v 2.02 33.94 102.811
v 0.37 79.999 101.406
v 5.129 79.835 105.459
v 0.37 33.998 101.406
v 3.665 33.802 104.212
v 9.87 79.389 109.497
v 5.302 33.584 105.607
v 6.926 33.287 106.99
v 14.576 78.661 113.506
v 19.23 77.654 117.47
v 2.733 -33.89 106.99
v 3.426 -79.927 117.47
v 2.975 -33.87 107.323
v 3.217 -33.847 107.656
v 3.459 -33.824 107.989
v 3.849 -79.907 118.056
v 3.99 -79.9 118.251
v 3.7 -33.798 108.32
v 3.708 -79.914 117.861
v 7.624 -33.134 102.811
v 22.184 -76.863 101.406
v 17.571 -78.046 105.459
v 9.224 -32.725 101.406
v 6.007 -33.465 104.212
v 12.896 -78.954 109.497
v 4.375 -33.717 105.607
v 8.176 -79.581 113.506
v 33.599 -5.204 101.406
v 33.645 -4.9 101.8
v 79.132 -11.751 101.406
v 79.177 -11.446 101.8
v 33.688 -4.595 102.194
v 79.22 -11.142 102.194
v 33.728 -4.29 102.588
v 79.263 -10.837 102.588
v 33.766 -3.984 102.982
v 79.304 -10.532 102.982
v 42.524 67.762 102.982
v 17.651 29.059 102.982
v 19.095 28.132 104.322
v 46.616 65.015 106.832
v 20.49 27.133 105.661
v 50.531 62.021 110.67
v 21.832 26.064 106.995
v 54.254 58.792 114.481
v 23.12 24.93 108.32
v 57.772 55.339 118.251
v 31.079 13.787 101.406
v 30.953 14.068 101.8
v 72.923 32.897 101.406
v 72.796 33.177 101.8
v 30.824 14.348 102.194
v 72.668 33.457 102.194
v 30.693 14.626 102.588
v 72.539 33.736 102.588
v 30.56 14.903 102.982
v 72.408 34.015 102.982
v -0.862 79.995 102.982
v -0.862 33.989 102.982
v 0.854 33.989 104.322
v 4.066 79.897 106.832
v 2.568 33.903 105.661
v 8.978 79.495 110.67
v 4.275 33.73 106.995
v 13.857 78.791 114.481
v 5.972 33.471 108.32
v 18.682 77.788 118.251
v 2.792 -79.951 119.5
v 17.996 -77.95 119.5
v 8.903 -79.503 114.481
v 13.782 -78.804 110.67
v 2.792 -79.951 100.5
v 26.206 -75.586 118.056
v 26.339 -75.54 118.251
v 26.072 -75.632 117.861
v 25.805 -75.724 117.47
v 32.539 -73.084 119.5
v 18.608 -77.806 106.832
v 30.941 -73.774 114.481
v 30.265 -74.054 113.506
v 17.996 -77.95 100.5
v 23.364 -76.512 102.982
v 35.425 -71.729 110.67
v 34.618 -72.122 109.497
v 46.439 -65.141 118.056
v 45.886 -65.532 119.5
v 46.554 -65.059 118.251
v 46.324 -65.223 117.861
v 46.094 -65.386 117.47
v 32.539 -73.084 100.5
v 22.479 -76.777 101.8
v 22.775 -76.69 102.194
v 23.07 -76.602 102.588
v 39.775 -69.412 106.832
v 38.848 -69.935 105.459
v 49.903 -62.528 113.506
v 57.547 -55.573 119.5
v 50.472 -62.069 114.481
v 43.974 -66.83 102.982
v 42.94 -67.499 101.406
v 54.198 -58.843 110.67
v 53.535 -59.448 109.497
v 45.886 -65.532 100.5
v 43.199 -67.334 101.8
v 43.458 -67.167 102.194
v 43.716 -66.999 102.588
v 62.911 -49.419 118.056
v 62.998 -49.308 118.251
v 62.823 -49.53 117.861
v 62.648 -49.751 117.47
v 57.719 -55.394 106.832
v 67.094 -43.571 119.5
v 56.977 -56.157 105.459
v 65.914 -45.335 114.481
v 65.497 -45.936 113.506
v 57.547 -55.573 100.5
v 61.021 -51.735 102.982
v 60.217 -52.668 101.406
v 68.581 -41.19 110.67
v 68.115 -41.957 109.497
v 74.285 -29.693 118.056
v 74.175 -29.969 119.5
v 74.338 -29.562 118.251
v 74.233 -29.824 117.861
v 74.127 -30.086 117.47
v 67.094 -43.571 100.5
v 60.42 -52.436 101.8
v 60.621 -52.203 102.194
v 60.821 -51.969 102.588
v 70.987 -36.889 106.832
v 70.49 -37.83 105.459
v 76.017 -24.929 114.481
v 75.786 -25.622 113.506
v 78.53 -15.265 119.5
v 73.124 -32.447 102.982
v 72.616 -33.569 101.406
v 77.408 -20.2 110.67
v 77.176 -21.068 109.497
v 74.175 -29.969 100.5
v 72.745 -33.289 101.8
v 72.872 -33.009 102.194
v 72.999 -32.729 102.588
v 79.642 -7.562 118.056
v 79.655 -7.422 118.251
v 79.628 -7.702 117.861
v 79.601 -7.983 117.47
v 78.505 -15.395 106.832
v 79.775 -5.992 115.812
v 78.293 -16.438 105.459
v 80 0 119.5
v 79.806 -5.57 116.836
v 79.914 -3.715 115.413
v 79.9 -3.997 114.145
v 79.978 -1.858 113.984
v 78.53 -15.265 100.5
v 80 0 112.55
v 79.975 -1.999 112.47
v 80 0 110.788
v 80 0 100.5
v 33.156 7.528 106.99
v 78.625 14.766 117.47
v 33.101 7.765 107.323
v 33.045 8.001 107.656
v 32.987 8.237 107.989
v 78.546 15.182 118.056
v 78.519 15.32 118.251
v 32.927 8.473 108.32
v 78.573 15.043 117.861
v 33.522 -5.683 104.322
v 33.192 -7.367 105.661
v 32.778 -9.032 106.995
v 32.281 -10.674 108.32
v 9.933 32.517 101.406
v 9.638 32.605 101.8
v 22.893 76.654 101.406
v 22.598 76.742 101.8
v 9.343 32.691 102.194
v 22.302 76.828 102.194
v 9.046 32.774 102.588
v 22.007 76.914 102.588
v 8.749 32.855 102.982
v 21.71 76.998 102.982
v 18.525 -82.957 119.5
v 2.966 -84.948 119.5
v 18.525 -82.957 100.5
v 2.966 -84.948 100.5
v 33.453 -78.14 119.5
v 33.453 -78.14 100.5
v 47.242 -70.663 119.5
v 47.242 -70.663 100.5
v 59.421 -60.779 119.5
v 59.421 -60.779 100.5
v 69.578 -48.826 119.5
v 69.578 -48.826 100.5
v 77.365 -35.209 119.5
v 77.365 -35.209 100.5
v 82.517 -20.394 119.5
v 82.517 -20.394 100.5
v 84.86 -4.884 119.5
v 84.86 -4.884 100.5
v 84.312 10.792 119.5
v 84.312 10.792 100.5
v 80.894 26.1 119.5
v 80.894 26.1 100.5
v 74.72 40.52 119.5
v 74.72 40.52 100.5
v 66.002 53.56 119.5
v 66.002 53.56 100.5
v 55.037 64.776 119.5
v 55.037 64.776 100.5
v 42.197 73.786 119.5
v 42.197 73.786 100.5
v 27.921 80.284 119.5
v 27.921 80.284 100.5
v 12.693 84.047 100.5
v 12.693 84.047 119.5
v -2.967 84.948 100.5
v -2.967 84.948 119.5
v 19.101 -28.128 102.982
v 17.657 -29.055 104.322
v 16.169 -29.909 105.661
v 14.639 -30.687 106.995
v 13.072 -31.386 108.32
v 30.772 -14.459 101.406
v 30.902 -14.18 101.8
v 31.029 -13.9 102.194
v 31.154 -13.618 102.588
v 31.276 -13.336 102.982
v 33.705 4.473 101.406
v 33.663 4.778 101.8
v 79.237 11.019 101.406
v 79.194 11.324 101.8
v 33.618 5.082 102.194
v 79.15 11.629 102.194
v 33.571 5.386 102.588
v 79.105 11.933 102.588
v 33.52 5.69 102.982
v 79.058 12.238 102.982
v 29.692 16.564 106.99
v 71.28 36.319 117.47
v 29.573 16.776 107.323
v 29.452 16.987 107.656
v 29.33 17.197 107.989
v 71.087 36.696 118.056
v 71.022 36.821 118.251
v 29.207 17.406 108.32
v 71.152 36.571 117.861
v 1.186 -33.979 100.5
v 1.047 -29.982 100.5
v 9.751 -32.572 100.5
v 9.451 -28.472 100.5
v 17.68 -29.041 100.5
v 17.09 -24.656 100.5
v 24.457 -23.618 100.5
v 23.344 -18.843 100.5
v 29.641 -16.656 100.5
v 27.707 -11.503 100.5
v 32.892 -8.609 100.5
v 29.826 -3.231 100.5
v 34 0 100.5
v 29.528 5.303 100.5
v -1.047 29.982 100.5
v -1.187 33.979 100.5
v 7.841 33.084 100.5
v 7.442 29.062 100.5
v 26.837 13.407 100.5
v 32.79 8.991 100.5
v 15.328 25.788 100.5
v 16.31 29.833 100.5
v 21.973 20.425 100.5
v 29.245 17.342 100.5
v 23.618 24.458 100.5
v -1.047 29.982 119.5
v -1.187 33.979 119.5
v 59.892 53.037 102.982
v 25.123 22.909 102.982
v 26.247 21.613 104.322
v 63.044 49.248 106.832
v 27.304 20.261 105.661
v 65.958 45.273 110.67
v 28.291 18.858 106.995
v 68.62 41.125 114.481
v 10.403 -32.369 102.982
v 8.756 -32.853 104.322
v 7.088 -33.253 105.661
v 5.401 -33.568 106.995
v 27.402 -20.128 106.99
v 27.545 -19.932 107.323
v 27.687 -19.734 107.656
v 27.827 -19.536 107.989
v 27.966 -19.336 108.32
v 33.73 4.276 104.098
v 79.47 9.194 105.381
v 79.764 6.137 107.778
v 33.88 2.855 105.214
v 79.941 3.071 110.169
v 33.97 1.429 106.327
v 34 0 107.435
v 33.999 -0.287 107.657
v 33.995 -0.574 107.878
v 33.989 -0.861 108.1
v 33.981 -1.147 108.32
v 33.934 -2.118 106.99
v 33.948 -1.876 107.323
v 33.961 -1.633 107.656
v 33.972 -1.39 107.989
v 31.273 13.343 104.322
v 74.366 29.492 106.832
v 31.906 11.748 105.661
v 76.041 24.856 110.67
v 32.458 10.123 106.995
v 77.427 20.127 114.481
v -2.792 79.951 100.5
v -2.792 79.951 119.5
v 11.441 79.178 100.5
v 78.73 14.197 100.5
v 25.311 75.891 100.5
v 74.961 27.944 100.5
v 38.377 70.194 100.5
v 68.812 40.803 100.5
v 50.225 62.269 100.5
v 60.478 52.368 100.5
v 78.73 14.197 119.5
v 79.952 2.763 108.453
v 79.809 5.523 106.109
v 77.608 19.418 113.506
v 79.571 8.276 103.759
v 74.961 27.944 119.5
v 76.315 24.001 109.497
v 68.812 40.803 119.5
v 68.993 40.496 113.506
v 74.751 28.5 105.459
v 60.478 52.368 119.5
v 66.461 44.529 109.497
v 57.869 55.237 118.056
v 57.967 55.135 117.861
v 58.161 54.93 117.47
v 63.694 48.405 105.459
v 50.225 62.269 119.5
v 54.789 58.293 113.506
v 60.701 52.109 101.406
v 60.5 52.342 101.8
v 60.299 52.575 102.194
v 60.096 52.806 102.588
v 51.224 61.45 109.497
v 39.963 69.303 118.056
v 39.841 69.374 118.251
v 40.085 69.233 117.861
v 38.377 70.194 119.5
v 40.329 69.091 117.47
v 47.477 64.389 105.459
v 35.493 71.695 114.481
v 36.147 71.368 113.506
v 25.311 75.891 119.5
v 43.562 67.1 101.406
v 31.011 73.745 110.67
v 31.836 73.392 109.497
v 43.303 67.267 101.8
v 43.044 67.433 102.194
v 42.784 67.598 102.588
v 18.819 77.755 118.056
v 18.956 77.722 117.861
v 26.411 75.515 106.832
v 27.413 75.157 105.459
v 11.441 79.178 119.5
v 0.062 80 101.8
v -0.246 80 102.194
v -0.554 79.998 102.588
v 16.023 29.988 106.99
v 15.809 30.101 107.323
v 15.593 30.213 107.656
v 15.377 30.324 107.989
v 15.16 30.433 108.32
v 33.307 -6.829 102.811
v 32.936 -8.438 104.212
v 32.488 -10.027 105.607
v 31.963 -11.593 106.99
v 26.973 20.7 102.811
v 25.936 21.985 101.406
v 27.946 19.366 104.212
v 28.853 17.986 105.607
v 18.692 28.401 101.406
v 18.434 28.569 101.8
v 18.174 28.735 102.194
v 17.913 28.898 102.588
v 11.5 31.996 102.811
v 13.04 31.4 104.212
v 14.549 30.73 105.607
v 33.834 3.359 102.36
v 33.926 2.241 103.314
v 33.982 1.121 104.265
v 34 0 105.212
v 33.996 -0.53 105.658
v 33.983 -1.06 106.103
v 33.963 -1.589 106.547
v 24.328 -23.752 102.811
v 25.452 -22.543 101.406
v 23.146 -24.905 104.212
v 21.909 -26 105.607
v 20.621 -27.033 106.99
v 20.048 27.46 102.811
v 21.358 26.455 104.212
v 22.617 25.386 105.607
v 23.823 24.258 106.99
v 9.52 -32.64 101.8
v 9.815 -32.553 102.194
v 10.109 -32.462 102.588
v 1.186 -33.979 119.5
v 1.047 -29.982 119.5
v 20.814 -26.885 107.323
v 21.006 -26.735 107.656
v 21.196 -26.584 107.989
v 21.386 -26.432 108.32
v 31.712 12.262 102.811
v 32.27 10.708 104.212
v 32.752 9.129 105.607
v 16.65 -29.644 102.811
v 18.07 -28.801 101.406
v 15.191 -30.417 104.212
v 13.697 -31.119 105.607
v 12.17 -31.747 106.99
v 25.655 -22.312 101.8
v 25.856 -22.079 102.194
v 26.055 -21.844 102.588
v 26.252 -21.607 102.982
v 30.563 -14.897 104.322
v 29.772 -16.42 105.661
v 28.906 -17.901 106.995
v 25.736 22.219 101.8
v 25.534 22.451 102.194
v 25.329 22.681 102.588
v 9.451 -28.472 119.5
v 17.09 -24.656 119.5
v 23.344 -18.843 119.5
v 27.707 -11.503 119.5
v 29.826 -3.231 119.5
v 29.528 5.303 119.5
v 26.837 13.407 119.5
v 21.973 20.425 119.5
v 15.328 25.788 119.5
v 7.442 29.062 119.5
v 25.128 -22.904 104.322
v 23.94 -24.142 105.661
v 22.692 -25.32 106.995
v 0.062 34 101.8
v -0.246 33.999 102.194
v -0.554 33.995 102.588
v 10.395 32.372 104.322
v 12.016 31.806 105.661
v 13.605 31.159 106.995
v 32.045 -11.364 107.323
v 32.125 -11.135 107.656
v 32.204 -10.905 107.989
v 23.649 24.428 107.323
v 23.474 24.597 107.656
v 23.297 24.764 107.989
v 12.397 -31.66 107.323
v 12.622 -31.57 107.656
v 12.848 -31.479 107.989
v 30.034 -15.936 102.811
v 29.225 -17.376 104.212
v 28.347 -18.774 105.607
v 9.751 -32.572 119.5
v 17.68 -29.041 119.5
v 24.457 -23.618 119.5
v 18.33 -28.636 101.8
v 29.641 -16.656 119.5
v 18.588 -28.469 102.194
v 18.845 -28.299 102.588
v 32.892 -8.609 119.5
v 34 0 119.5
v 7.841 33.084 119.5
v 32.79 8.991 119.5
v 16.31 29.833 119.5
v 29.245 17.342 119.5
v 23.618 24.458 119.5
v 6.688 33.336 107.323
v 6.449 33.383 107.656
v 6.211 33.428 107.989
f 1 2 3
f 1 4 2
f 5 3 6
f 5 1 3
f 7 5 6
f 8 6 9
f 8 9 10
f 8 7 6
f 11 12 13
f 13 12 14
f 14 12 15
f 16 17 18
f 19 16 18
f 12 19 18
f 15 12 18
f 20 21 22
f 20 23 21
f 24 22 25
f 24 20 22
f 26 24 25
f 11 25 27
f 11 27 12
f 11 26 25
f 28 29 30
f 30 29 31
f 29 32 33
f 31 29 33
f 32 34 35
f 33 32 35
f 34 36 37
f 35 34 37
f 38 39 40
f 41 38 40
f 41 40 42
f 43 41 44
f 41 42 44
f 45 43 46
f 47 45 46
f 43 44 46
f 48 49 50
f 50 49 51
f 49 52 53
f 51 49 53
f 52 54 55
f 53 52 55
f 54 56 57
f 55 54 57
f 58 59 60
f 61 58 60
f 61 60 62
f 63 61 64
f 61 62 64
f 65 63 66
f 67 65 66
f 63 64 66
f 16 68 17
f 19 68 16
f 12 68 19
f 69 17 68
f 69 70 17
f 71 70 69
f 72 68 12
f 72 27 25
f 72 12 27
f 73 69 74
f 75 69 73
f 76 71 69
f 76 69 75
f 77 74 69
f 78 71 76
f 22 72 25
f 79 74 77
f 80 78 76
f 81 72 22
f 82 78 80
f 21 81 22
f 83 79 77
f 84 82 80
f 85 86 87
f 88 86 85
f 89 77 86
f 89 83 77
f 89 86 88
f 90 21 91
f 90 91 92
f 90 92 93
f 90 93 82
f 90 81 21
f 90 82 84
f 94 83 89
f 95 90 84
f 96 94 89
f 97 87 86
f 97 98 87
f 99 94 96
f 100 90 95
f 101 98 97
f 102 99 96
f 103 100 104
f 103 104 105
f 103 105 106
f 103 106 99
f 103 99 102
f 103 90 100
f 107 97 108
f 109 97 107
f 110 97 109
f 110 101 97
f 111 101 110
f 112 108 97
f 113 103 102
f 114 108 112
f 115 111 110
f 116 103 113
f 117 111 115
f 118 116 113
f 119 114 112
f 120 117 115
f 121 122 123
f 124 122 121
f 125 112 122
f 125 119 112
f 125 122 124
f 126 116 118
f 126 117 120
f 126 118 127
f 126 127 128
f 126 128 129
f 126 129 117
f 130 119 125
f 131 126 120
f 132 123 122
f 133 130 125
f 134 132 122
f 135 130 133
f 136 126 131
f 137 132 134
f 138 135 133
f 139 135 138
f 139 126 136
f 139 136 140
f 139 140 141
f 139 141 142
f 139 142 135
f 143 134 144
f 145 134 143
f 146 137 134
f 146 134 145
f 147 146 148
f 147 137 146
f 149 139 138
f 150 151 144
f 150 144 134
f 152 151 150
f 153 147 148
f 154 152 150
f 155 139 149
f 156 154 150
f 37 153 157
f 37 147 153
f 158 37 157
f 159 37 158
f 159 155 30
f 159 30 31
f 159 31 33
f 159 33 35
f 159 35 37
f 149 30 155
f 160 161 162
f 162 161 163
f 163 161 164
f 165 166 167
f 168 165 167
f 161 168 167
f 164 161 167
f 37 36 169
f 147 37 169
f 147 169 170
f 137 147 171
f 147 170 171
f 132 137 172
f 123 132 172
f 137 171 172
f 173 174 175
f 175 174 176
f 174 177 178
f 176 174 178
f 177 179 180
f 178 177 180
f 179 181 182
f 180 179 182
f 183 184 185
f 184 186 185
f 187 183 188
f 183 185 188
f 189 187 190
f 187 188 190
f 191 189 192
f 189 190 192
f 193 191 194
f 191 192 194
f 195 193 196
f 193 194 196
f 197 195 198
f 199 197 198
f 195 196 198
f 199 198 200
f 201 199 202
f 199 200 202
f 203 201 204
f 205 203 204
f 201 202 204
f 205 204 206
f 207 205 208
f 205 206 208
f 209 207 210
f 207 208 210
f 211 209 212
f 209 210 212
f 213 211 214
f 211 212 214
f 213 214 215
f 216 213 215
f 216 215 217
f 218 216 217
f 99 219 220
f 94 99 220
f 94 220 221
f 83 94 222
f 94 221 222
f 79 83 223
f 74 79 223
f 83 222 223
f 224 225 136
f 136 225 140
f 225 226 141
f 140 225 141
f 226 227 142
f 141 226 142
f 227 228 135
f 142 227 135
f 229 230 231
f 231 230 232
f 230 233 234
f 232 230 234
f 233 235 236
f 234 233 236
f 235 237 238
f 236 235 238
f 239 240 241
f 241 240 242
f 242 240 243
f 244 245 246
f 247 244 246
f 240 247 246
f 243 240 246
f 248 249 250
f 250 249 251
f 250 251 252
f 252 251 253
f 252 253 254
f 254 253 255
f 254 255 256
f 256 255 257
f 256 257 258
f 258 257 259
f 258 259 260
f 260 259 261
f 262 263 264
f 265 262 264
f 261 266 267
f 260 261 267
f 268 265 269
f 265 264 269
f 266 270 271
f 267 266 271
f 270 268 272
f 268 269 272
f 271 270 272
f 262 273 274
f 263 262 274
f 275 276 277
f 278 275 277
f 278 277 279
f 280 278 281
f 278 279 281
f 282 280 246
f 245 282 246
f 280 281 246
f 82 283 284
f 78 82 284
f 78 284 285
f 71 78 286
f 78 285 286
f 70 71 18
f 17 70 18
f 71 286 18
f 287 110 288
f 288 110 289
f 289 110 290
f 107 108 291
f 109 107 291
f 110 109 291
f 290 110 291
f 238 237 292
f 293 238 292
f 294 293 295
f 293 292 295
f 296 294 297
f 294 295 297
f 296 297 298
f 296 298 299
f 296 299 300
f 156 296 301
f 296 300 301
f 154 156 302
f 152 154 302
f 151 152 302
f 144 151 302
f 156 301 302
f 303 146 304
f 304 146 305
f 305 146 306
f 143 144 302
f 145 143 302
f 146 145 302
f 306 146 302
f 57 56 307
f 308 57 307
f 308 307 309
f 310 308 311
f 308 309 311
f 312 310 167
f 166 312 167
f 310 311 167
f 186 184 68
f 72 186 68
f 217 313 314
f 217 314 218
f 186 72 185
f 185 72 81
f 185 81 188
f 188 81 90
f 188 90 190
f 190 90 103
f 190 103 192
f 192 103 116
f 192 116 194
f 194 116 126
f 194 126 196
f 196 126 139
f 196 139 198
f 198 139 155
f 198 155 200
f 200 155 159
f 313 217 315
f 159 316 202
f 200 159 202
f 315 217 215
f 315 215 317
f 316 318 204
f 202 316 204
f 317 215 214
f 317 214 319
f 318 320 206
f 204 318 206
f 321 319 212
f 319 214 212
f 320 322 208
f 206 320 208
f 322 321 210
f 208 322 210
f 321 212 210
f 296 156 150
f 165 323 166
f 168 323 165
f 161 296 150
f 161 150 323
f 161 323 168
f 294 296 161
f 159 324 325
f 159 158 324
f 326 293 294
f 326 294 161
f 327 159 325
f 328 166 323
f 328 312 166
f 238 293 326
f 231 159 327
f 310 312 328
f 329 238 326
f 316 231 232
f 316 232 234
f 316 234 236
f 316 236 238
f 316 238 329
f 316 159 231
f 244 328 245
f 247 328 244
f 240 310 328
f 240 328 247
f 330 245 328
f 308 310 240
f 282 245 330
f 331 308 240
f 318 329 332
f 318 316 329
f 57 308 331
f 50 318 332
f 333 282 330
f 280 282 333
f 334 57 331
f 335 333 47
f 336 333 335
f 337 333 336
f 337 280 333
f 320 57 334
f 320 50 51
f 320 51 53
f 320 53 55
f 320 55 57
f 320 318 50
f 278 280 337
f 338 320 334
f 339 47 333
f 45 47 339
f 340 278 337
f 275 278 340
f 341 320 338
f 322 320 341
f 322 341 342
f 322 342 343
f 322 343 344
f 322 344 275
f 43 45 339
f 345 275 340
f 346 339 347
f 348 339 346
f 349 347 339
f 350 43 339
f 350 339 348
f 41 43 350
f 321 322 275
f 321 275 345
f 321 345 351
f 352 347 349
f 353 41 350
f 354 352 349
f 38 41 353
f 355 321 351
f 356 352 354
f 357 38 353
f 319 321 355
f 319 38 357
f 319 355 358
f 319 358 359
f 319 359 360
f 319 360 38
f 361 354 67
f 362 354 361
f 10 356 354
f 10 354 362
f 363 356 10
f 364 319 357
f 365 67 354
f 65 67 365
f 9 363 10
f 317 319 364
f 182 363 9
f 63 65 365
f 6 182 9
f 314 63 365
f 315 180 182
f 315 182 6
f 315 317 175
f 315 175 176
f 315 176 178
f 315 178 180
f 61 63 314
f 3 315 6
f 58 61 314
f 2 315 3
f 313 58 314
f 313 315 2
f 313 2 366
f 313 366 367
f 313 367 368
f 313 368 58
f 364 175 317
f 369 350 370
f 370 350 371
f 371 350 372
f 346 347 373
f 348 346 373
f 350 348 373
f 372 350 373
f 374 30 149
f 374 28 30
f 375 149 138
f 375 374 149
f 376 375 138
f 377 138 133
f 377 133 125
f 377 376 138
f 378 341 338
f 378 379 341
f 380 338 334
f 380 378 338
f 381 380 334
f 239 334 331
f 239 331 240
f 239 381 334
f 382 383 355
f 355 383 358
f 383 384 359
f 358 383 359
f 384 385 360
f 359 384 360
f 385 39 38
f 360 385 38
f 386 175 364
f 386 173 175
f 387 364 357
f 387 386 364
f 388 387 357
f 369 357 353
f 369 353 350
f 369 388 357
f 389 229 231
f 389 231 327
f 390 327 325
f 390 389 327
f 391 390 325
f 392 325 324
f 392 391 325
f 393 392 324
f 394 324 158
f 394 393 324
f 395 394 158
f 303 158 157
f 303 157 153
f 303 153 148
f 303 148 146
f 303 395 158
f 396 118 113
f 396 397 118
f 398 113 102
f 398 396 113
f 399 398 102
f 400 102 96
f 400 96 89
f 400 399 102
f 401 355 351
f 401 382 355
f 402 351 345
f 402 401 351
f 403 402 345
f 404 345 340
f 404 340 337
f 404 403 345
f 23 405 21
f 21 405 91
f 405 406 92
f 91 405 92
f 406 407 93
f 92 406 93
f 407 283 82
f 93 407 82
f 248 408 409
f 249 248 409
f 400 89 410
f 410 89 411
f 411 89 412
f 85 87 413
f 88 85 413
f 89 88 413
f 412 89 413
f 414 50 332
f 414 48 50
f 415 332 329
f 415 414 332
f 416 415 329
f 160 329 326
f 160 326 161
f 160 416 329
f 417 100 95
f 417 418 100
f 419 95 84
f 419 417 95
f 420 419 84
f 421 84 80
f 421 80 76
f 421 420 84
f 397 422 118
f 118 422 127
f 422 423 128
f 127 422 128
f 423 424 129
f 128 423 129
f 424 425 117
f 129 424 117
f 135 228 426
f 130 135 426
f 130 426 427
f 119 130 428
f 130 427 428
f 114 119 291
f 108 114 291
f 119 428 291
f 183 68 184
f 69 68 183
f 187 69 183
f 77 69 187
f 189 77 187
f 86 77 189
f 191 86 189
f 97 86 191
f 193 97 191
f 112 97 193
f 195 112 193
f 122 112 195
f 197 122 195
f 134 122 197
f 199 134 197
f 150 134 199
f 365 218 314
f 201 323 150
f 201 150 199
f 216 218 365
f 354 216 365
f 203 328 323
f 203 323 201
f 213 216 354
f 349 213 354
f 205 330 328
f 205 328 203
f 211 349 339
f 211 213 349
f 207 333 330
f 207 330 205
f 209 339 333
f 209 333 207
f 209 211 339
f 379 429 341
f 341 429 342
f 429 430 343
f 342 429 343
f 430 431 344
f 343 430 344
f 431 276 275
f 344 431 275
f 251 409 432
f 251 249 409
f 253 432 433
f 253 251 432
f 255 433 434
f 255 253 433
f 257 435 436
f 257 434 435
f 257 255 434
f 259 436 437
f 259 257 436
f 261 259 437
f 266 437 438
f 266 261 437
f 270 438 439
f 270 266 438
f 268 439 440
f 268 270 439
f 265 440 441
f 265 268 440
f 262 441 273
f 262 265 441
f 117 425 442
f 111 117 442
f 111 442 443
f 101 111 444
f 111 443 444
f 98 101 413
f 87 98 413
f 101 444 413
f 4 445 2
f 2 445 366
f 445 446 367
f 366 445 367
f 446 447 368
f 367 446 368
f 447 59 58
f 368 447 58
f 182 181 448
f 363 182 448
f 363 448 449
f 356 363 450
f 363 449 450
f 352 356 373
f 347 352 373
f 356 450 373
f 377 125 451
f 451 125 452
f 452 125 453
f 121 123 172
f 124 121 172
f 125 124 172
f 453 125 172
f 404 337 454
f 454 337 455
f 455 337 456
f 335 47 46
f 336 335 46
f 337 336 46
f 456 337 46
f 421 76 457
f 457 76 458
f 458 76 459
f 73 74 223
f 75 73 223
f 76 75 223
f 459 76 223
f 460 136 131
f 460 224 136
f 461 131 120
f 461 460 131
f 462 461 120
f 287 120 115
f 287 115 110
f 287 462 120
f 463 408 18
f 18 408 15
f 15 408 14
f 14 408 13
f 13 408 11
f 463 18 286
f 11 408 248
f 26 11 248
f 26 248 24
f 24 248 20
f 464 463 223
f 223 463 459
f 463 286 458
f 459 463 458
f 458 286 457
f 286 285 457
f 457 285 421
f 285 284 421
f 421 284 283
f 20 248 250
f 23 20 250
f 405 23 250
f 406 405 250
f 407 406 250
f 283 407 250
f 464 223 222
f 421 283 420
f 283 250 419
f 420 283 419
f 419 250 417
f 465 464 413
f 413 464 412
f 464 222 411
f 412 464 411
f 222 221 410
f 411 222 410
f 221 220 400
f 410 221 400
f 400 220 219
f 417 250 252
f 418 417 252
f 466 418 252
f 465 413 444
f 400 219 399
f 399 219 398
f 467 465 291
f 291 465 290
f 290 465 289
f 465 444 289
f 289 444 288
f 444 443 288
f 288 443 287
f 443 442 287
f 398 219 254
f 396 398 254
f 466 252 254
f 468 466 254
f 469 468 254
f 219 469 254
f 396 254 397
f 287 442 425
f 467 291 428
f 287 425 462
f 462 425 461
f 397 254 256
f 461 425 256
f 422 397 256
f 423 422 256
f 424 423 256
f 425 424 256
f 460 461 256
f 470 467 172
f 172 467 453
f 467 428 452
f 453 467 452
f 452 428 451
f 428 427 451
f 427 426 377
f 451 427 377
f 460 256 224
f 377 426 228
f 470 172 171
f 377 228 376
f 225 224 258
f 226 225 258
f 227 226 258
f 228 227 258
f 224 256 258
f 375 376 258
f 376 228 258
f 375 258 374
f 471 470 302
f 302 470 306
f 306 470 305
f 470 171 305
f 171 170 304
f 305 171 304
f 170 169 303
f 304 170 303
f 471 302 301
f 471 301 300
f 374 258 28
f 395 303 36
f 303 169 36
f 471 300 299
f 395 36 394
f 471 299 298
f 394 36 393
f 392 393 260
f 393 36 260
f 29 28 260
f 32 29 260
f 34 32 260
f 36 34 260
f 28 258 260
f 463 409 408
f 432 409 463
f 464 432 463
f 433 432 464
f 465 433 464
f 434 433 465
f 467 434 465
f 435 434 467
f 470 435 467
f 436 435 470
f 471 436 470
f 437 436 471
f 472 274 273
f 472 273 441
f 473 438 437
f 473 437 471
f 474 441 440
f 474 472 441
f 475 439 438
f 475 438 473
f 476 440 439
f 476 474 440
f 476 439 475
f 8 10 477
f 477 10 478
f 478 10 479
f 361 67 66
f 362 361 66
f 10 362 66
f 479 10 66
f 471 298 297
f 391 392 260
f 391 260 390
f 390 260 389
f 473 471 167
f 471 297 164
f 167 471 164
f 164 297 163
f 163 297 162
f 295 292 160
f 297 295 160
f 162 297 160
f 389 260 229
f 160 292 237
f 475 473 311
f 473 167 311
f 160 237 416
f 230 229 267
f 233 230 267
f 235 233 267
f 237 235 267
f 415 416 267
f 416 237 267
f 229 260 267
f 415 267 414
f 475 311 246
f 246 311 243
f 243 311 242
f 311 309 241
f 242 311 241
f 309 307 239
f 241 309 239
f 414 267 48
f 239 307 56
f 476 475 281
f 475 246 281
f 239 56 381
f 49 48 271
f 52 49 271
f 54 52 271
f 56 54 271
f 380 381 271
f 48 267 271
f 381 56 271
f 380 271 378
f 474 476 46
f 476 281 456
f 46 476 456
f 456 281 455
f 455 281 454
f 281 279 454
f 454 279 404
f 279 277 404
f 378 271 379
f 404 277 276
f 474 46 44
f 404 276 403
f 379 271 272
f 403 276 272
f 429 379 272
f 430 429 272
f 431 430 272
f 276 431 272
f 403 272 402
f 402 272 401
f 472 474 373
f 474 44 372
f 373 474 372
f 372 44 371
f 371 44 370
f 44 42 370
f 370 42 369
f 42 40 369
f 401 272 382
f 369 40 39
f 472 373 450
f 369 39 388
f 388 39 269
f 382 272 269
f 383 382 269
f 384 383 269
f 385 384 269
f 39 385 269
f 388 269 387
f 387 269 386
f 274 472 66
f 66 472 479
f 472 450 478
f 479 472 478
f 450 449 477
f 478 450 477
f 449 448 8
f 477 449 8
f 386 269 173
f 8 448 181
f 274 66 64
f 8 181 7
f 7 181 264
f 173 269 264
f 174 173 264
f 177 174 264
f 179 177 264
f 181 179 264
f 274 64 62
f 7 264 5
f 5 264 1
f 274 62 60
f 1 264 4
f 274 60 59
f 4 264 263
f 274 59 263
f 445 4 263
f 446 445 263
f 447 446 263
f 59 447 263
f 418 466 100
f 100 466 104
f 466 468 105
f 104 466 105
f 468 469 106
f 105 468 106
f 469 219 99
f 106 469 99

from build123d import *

# Parameters (mm, degrees)
BOX002_W                  = 500
BOX002_H                  = 500
BOX002_DEPTH              = 500
BOX002_PLACEMENT_ANGLE    = 2
TUBE021_R                 = 85
TUBE021_R_2               = 80
TUBE021_DEPTH             = 19
TUBE013_R                 = 100
TUBE013_R_2               = 80
TUBE013_DEPTH             = 200
PAD028_DEPTH              = 100
PAD029_DEPTH              = 2
COMMON012_PLACEMENT_ANGLE = 38
ARRAY012_COUNT            = 22
ARRAY012_PLACEMENT_ANGLE  = 180
TUBE022_R                 = 34
TUBE022_R_2               = 30
TUBE022_DEPTH             = 19


with BuildPart() as cube002:
    # Box002 → Box002 (new body)
    with BuildSketch(Plane.XY):
        with Locations((250, 250)):
            Rectangle(BOX002_W, BOX002_H)
    extrude(amount=BOX002_DEPTH)


with BuildPart() as cube002_1:
    # Box002 placement: moved
    add(cube002.part.moved(Location((8.73, -250, 0))).rotate(Axis((8.73, -250, 0), (0, 0, 1)), BOX002_PLACEMENT_ANGLE))


with BuildPart() as tube021:
    # Tube021 → Tube021 (new body)
    with BuildSketch(Plane.XY.offset(100.5)):
        Circle(TUBE021_R)
        Circle(TUBE021_R_2, mode=Mode.SUBTRACT)
    extrude(amount=TUBE021_DEPTH)


with BuildPart() as tube013:
    # Tube013 → Tube013 (new body)
    with BuildSketch(Plane.XY):
        Circle(TUBE013_R)
        Circle(TUBE013_R_2, mode=Mode.SUBTRACT)
    extrude(amount=TUBE013_DEPTH)


with BuildPart() as body029:
    # Sketch028 → Pad028 (new body)
    with BuildSketch(Plane.XZ):
        Polygon((0, 0), (0, 2), (26, 0.9), (26, 0), align=None)
    extrude(amount=PAD028_DEPTH)


with BuildPart() as body029_1:
    # Body029 placement: moved
    add(body029.part.moved(Location((-5, 0, 5))))


with BuildPart() as cut002:
    # Sketch029 → Pad029 (new body)
    with BuildSketch(Plane.XY):
        Polygon((0, 0), (0, -52), (25.94305, -47.924315), (8.5, 0), align=None)
    extrude(amount=PAD029_DEPTH)


with BuildPart() as cut002_1:
    # Body030 placement: moved
    add(cut002.part.moved(Location((-5, -33, 5))))

    # Common012: intersect Body029
    add(body029_1.part, mode=Mode.INTERSECT)


with BuildPart() as cut002_2:
    # Common012 placement: moved
    add(cut002_1.part.rotate(Axis((0, 0, 0), (0, 1, 0)), COMMON012_PLACEMENT_ANGLE))

    # Array012: Cut002 ×22 about axis
    array012_axis = Axis((0, 0, 0), (0, 0, 1))


with BuildPart() as cut002_3:
    add(cut002_2.part)
    for i in range(1, ARRAY012_COUNT):
        add(cut002_2.part.rotate(array012_axis, i * 360 / ARRAY012_COUNT))


with BuildPart() as cut002_4:
    # Array012 placement: moved
    add(cut002_3.part.moved(Location((0, 0, 110))).rotate(Axis((0, 0, 110), (0, 1, 0)), ARRAY012_PLACEMENT_ANGLE))

    # Cut002: cut Tube013
    add(tube013.part, mode=Mode.SUBTRACT)


with BuildPart() as stator1h1:
    # Tube022 → Tube022 (new body)
    with BuildSketch(Plane.XY.offset(100.5)):
        Circle(TUBE022_R)
        Circle(TUBE022_R_2, mode=Mode.SUBTRACT)
    extrude(amount=TUBE022_DEPTH)

    # Fusion010: union Tube021, Cut002
    add(tube021.part)
    add(cut002_4.part)

    # Common017: intersect Cube002
    add(cube002_1.part, mode=Mode.INTERSECT)


solid = stator1h1.part
